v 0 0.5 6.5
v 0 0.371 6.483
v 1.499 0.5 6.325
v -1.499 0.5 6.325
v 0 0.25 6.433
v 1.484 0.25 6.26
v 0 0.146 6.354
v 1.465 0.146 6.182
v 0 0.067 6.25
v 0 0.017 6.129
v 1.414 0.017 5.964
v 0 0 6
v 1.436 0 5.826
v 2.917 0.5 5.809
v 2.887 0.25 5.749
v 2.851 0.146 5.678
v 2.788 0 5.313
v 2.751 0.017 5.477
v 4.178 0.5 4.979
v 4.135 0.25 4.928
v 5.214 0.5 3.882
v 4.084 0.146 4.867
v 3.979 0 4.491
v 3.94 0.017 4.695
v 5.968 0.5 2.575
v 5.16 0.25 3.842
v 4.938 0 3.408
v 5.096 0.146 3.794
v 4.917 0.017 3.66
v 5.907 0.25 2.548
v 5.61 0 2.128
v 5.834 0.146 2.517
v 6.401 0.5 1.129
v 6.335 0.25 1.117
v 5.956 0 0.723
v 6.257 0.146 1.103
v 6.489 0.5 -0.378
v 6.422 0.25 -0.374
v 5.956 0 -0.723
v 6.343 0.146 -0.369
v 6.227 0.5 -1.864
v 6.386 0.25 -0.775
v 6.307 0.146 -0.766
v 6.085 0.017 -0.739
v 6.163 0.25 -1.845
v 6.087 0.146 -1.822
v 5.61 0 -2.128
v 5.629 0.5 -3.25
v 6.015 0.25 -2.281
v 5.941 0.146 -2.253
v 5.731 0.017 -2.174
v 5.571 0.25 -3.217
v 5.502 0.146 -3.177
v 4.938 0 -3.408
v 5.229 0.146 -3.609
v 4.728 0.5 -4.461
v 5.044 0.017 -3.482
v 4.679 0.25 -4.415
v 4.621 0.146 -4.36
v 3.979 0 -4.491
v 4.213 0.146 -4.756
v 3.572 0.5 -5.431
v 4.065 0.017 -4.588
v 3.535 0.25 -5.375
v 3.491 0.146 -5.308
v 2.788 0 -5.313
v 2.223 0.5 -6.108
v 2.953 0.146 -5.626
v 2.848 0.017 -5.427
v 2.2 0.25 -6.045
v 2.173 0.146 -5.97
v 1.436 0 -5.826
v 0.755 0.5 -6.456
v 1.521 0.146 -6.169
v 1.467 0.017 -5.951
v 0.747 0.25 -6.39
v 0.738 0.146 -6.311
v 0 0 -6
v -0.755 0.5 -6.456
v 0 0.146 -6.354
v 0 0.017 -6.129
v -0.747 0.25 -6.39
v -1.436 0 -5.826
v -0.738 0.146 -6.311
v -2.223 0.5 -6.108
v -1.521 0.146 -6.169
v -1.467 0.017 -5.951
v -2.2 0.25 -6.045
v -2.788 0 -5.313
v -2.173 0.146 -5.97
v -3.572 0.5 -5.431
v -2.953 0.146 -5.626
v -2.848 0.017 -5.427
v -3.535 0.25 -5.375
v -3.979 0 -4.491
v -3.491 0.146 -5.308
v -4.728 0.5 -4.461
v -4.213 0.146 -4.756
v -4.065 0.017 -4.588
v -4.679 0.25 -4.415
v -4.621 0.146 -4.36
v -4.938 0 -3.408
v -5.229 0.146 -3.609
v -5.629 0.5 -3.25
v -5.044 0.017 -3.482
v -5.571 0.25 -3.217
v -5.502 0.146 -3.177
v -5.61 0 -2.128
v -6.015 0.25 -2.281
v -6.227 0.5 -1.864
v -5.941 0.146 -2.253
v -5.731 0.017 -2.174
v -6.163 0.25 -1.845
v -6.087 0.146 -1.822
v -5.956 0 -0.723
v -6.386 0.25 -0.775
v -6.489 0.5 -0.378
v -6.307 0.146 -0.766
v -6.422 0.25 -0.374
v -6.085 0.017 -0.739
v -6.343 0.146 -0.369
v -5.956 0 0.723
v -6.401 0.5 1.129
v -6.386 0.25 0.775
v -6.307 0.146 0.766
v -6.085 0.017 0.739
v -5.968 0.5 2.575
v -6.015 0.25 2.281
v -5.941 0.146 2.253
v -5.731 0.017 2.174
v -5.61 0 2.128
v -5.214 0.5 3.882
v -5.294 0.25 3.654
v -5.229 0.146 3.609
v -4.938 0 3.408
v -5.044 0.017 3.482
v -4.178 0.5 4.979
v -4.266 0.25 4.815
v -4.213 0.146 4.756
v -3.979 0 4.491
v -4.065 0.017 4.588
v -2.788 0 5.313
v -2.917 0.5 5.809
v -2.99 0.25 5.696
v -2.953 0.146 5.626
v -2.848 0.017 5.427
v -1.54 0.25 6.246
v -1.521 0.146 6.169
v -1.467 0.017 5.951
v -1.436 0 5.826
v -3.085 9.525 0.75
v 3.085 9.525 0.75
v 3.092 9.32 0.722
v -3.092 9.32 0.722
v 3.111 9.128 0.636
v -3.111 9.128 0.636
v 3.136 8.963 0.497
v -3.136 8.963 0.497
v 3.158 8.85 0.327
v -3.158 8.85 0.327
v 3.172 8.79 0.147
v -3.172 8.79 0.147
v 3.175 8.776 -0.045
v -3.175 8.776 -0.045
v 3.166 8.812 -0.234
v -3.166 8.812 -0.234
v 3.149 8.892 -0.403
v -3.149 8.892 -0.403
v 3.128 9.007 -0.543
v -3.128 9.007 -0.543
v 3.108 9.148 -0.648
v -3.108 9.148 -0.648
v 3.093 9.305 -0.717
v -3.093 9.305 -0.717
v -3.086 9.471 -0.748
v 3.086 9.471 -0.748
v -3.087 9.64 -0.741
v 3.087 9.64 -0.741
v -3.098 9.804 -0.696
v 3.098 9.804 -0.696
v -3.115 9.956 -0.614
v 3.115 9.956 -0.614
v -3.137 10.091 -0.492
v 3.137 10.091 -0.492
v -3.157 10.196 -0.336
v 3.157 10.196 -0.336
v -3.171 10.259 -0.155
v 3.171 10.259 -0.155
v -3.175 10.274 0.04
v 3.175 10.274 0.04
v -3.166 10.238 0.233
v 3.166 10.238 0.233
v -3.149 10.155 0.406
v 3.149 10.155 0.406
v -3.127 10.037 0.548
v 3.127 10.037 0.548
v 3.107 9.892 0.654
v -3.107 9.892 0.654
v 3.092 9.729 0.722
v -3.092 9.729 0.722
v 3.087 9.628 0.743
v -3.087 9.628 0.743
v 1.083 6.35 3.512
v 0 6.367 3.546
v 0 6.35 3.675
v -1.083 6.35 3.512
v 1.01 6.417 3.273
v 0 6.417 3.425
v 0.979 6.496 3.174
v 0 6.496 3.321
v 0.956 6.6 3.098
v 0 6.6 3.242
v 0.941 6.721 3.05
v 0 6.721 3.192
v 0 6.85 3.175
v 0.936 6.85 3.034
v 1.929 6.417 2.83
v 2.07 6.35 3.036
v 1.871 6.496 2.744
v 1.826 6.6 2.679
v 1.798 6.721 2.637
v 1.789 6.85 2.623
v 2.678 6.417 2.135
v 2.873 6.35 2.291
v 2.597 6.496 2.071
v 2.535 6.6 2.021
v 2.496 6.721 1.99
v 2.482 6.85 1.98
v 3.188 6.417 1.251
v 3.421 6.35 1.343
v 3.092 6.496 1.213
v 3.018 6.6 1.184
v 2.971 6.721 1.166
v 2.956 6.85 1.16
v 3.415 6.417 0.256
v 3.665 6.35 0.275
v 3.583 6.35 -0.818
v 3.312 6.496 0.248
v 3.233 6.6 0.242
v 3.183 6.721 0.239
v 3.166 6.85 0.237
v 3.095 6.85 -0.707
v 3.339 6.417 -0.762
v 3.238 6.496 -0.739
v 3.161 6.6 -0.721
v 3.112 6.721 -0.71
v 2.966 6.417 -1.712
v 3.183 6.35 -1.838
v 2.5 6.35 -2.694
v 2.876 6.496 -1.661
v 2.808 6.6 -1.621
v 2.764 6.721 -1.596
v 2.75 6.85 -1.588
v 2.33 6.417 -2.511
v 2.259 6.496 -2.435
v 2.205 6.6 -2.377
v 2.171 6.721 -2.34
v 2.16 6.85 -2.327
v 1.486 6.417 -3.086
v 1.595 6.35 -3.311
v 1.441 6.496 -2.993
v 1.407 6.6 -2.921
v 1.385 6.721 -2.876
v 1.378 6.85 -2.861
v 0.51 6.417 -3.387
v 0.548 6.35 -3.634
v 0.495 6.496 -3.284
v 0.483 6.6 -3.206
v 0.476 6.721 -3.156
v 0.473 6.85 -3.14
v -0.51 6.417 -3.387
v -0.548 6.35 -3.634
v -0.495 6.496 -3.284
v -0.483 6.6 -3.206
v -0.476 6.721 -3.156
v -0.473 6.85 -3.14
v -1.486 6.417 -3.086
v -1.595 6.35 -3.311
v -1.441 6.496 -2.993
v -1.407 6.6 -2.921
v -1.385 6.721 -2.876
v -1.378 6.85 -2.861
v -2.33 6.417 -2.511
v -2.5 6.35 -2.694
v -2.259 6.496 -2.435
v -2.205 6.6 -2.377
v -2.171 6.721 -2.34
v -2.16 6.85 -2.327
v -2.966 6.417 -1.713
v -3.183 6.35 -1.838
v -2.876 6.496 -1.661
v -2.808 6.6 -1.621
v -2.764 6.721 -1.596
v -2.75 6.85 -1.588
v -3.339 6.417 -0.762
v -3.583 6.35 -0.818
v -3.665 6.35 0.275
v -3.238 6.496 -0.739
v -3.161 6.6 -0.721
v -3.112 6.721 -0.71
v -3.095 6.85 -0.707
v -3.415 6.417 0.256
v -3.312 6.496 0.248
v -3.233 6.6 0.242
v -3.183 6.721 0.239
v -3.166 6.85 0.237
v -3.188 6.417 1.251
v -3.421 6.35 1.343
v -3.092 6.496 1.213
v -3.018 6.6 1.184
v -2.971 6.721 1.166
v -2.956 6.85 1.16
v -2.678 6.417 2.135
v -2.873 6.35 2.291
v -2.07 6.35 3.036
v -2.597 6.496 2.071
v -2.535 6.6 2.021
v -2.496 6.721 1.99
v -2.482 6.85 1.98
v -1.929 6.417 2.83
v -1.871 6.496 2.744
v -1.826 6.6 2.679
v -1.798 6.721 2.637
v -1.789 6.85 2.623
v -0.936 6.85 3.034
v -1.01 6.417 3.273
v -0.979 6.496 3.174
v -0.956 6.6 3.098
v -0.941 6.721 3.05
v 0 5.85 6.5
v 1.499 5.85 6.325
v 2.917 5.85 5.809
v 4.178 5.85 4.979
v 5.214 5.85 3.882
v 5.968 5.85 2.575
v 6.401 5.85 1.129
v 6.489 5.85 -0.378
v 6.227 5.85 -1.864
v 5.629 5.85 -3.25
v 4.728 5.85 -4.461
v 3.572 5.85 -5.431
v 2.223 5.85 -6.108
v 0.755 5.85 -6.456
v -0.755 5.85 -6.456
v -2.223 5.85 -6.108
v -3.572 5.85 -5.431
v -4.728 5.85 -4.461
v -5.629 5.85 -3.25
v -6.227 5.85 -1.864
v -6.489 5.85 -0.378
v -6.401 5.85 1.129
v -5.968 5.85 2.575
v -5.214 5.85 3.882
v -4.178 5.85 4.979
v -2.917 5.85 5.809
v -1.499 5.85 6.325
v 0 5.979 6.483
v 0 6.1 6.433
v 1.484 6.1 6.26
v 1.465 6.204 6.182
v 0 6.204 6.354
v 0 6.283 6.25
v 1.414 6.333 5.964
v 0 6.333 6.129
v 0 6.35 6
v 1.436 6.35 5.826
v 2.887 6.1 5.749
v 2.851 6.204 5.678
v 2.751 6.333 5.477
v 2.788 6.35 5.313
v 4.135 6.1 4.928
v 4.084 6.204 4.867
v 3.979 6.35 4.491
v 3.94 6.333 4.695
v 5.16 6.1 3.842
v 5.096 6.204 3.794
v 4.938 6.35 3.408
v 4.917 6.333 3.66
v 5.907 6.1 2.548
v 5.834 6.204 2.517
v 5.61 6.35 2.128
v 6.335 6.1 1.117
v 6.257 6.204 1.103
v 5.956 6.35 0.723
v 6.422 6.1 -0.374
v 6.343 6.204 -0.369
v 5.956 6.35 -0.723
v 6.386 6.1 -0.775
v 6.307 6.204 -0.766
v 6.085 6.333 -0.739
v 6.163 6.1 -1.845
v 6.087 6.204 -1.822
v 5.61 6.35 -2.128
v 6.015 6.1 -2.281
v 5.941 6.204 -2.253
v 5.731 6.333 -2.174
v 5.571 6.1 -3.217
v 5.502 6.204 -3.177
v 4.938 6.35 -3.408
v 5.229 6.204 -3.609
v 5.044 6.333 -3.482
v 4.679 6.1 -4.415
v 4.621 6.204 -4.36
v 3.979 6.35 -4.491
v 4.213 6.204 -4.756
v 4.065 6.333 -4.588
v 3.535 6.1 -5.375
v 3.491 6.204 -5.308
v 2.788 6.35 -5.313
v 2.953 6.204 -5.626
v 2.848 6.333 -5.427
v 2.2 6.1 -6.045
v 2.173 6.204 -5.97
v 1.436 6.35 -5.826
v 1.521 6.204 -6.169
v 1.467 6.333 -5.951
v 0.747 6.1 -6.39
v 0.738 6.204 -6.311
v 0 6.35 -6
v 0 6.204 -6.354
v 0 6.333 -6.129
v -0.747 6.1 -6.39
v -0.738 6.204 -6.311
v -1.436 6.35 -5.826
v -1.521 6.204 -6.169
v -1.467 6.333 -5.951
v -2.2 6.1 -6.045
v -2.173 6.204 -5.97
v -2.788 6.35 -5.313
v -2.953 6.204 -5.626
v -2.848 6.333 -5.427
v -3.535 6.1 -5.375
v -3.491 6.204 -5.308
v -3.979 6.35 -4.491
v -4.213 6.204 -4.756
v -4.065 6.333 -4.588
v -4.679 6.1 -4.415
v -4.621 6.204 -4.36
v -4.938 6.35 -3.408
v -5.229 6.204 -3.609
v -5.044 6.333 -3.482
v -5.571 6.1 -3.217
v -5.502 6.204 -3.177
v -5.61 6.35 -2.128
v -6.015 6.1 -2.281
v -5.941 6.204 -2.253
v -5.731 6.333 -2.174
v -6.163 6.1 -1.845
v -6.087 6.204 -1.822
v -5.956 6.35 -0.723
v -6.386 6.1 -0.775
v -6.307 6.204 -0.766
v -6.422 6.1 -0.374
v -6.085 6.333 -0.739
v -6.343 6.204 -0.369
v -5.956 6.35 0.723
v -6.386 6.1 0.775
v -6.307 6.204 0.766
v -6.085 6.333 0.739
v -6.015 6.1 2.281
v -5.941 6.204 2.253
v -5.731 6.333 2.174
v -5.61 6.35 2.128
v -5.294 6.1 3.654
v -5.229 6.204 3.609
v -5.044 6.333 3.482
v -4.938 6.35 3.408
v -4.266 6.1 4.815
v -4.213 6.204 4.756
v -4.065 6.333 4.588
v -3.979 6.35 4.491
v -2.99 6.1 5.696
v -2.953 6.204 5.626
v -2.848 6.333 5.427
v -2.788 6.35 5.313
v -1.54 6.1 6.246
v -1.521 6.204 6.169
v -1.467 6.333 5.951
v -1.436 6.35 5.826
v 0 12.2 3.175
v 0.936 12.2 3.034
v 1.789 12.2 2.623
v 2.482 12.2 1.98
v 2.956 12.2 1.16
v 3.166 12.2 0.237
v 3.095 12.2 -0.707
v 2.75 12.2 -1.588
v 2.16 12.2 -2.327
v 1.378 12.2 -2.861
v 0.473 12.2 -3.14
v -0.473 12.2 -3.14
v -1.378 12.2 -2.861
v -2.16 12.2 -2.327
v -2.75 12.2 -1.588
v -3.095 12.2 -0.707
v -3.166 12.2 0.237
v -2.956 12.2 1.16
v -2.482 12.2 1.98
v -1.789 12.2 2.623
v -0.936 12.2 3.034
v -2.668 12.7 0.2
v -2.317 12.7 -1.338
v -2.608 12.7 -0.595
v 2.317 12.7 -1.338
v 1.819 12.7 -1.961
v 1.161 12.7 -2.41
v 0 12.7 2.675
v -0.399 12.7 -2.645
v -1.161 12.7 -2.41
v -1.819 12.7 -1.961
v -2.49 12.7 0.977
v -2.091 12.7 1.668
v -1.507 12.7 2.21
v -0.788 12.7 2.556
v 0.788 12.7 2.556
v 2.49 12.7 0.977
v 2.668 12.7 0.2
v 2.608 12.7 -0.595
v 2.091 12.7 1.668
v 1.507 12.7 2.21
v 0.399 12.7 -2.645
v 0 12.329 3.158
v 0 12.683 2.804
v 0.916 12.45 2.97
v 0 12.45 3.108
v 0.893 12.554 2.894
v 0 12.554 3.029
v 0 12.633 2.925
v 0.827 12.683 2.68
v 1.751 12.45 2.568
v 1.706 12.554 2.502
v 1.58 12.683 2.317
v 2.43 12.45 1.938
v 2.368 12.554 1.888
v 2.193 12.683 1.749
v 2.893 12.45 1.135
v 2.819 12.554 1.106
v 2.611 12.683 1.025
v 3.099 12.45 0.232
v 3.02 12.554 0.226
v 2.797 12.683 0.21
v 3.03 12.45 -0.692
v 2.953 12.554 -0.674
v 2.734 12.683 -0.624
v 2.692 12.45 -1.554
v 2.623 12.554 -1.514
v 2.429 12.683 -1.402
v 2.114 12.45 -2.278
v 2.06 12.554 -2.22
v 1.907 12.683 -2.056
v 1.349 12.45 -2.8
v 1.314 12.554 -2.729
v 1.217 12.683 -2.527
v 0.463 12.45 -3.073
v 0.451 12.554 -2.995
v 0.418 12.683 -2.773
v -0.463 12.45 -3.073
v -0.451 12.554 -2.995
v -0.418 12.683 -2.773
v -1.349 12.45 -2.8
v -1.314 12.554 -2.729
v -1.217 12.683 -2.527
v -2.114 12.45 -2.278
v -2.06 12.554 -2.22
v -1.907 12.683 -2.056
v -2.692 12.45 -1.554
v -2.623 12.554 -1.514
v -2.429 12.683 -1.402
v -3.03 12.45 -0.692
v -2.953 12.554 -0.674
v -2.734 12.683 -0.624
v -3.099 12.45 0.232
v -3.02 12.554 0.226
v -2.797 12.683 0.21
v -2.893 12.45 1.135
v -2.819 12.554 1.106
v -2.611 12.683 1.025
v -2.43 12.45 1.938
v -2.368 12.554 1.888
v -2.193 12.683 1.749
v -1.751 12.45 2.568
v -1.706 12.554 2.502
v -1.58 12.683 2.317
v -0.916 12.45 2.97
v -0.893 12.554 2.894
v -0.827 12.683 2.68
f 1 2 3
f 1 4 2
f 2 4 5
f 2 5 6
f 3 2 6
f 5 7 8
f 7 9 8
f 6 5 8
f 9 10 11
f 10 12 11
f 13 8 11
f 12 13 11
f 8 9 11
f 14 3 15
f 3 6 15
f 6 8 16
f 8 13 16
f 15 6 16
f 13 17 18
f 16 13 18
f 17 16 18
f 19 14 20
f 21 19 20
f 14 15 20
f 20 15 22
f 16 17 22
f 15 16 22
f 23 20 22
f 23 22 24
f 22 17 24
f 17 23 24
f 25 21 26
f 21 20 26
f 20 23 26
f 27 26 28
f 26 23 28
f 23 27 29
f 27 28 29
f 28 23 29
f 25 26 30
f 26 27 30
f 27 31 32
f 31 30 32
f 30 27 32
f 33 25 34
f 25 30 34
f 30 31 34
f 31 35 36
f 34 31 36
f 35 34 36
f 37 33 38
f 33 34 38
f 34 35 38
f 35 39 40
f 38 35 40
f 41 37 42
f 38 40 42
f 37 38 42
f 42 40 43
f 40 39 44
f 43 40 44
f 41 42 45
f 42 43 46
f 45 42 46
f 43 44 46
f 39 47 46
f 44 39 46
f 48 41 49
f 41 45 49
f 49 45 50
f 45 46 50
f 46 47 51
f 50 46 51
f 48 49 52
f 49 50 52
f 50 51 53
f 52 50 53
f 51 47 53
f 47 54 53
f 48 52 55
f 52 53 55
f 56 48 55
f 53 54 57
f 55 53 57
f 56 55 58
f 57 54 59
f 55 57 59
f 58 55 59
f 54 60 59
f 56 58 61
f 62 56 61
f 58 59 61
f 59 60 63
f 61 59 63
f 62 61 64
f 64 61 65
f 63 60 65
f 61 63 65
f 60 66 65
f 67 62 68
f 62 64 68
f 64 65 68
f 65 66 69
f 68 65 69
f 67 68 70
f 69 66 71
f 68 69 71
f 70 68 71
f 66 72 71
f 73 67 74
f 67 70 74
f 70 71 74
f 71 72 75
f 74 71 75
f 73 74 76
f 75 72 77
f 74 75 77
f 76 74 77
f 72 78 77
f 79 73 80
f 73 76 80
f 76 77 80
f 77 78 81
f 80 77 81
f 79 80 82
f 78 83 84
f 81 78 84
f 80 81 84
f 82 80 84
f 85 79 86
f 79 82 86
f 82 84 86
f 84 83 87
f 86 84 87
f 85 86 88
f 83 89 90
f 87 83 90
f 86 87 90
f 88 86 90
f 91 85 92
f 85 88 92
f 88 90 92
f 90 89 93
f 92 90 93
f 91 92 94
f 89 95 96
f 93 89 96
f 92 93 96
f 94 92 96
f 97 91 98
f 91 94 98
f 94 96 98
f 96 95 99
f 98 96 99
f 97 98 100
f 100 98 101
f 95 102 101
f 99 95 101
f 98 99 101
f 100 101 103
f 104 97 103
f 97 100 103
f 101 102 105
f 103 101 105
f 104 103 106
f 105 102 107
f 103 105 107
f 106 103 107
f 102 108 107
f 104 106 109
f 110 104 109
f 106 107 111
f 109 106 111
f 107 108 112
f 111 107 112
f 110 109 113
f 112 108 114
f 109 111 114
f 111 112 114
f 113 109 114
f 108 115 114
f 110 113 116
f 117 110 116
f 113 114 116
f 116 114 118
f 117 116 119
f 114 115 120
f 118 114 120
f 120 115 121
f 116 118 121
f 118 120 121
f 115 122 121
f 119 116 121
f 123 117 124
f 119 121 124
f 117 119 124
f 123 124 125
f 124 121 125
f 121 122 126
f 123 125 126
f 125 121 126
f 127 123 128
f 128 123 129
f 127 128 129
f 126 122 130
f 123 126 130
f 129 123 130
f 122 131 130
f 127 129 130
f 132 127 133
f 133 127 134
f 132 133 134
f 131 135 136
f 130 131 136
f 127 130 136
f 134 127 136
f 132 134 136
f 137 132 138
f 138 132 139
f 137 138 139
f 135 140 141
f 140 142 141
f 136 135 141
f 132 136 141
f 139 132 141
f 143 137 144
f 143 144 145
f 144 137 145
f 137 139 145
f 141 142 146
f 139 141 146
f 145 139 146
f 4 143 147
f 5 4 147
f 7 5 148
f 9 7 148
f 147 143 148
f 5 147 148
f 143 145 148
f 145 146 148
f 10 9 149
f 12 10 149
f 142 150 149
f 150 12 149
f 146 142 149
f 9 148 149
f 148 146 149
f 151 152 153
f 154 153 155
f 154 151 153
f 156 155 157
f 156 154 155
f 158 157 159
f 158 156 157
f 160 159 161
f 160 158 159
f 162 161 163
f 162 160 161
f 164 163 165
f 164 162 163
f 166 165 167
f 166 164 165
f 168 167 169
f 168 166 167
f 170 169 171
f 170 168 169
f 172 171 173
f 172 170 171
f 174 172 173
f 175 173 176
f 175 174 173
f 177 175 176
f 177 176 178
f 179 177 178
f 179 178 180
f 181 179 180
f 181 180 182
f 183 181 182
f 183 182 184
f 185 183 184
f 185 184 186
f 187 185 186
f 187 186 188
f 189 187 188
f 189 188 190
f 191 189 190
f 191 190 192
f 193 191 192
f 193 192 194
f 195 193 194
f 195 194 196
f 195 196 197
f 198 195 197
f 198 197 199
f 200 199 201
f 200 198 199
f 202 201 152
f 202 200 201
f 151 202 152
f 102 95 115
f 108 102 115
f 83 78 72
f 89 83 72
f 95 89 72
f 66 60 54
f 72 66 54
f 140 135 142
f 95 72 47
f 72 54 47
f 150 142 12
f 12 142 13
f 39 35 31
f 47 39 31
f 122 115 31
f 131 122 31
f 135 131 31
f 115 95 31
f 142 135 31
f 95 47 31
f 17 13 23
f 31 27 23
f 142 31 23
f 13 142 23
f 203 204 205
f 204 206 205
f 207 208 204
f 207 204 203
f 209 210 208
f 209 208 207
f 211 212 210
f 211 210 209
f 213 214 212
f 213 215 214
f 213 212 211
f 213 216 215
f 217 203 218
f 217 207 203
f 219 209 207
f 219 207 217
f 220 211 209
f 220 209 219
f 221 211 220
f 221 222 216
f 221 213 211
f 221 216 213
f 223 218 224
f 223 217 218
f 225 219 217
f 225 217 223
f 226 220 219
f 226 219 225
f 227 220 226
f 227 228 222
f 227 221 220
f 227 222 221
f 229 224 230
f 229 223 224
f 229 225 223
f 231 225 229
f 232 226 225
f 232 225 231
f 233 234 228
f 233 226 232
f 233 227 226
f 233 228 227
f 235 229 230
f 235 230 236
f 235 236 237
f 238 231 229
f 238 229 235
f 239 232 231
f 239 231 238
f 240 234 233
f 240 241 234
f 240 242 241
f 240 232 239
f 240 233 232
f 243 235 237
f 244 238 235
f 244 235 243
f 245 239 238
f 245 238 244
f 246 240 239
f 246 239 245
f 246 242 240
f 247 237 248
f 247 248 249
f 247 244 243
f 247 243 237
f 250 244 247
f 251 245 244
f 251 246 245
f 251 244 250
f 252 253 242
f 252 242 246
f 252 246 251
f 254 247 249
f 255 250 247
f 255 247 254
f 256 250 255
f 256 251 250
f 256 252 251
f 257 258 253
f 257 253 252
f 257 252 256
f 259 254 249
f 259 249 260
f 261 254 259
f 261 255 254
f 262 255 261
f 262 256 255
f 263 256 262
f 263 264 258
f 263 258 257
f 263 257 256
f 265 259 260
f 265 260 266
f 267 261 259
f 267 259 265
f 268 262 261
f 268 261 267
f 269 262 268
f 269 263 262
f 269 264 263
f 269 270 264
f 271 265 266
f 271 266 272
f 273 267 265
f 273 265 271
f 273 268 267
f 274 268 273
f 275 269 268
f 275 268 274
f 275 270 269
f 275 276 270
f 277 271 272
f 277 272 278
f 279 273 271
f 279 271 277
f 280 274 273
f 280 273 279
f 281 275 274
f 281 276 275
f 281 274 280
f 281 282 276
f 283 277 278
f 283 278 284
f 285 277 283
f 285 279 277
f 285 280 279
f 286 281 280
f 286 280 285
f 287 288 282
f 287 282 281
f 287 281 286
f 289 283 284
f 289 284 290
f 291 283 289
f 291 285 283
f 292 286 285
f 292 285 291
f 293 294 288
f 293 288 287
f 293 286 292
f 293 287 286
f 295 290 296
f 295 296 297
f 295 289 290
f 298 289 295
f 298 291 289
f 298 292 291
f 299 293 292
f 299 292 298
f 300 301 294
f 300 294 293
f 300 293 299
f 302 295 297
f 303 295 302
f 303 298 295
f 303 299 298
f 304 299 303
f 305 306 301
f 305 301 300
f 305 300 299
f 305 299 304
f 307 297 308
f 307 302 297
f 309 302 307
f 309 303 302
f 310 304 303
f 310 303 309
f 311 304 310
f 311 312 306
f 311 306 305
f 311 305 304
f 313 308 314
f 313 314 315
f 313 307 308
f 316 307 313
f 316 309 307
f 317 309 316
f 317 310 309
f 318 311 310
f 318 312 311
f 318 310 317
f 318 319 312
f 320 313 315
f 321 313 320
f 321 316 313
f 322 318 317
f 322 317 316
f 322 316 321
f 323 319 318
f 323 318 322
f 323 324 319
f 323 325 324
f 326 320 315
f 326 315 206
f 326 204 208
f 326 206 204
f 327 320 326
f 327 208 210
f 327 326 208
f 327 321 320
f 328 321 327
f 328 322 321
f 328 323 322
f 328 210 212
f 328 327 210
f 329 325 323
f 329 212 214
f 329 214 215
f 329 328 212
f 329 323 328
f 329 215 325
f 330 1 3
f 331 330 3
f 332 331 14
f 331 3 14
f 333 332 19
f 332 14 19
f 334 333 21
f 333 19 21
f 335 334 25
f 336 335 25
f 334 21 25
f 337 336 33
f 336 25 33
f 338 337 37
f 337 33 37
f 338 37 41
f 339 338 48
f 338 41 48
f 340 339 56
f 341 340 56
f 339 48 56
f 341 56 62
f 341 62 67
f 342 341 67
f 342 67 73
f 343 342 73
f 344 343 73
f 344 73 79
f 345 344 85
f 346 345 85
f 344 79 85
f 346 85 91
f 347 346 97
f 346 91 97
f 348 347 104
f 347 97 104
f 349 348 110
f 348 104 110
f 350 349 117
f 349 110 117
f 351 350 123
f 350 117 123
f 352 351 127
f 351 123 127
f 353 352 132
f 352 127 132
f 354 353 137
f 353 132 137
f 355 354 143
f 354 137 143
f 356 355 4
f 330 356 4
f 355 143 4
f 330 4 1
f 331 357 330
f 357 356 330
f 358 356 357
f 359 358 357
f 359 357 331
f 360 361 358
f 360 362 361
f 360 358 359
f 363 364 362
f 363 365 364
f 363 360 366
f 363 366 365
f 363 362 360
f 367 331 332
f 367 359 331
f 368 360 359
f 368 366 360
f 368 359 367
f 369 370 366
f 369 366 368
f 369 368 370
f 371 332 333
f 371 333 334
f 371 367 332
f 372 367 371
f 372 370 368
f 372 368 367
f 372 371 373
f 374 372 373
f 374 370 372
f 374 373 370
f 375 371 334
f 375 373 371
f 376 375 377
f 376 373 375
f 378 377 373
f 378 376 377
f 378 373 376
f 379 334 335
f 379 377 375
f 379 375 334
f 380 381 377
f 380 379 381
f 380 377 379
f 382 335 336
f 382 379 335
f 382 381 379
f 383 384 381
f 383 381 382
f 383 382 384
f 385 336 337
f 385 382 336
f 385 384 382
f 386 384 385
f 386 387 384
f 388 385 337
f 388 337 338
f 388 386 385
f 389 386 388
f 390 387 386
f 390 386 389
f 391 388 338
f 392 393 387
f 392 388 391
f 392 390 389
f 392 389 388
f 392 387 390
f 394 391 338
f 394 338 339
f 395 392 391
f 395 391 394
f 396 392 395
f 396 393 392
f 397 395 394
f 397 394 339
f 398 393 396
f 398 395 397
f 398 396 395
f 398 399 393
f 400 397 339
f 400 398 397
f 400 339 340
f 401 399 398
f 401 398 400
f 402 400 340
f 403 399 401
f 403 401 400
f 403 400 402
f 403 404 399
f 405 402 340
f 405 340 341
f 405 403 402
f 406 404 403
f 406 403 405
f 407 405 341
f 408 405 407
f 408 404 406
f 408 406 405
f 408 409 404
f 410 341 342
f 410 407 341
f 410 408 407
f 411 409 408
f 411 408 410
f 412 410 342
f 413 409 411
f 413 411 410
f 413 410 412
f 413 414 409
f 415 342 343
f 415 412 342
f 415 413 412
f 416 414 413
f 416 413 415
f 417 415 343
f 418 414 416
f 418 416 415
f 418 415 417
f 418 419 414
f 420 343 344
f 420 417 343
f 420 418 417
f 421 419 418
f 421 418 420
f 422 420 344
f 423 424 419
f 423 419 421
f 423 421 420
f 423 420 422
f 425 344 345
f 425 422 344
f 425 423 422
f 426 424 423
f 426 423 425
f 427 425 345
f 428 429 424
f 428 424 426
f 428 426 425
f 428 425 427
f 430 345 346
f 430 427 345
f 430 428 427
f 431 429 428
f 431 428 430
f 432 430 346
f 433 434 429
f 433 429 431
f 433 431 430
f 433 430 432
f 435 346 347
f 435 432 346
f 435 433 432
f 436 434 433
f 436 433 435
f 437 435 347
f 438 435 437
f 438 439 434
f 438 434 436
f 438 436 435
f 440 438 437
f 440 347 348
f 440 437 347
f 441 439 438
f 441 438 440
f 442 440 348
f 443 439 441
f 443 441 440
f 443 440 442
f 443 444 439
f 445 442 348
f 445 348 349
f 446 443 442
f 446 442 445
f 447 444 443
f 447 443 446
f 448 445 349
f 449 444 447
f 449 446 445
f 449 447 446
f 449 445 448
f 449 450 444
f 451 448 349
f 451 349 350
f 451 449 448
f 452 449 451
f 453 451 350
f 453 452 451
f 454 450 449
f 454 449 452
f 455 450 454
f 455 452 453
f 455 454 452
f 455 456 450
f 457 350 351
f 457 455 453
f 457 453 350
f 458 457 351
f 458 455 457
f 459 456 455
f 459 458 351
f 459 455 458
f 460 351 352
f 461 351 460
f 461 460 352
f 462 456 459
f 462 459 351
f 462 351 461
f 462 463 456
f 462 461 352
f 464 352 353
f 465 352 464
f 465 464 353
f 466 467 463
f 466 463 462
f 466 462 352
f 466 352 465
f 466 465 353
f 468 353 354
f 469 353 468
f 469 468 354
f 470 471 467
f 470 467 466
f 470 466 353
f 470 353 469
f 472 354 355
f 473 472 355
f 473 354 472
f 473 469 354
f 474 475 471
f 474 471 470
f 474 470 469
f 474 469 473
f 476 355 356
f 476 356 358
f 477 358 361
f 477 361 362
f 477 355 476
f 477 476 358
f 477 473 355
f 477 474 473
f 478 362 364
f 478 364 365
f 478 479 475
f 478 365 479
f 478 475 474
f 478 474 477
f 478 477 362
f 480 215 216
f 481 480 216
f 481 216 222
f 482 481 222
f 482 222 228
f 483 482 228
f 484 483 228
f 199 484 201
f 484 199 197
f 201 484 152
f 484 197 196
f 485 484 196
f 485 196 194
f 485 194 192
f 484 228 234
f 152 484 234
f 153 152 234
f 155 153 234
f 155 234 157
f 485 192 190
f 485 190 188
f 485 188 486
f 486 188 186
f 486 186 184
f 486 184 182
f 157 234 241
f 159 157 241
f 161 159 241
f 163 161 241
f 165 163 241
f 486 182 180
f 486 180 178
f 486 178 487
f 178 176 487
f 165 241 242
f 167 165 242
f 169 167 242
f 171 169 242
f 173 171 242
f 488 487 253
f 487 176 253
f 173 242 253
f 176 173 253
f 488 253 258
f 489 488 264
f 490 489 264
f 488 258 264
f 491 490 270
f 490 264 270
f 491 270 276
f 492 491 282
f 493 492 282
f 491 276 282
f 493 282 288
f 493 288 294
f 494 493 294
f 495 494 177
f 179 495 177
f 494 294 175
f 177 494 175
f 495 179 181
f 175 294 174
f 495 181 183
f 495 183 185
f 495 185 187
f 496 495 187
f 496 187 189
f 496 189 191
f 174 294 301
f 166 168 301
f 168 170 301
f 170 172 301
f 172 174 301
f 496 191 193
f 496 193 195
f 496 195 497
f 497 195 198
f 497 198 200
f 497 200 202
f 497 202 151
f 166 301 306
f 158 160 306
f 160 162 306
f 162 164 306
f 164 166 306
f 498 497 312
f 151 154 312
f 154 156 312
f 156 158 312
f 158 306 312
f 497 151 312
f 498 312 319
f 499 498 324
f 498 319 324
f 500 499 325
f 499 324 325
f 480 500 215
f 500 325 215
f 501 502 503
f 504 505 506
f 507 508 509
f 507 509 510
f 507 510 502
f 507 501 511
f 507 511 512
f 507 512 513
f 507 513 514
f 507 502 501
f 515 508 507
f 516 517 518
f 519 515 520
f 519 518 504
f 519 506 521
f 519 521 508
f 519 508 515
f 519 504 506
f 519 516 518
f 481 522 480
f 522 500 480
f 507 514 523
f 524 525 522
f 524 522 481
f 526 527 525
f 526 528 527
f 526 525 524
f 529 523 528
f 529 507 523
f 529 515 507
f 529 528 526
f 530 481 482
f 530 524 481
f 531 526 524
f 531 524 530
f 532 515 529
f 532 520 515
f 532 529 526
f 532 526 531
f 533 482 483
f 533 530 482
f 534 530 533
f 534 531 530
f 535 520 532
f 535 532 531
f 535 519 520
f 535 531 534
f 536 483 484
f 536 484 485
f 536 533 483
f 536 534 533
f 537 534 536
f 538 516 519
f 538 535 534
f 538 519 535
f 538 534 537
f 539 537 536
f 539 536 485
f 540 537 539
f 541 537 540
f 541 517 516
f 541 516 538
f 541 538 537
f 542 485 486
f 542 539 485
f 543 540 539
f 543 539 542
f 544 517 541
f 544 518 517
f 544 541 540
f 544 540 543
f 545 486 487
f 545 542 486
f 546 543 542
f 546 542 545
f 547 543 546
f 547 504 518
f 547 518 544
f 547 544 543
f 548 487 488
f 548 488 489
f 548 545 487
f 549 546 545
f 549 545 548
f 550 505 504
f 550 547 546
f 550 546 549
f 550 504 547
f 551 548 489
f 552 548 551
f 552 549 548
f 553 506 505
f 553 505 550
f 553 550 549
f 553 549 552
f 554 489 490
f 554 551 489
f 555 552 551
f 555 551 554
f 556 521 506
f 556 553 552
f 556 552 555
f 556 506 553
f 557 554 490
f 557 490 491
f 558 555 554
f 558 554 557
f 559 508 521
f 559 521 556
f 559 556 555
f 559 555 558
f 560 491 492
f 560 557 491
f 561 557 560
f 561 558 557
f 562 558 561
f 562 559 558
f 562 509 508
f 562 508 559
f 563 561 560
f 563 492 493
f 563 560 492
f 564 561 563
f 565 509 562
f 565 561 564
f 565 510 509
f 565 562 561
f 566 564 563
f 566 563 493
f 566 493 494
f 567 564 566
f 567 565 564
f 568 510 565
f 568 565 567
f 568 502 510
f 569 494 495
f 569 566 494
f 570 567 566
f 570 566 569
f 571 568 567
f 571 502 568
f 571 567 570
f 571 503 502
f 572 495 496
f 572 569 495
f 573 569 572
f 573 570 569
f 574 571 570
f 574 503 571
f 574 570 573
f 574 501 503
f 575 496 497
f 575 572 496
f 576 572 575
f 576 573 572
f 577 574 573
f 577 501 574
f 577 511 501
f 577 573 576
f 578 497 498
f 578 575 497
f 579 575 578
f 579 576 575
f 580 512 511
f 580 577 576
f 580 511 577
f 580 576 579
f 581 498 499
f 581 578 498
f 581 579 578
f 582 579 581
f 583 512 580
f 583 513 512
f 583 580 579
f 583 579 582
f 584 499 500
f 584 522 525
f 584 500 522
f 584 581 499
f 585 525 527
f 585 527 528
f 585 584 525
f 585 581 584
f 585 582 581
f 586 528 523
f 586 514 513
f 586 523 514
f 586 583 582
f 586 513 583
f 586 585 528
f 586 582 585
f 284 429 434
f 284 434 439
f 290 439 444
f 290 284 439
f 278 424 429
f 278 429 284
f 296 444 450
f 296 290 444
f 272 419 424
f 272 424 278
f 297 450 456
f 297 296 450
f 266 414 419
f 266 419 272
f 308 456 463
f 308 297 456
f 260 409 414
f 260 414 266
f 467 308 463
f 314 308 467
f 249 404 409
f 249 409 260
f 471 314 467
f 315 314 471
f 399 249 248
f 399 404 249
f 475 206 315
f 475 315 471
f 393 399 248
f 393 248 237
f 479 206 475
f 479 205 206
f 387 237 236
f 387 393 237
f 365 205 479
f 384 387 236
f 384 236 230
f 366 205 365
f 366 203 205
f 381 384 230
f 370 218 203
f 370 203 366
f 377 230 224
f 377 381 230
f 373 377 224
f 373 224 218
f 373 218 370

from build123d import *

# Parameters (mm, degrees)
SKETCH2_R               = 6.5
BOSS_EXTRUDE1_DEPTH     = 6.35
SKETCH3_R               = 3.175
BOSS_EXTRUDE2_DEPTH     = 6.35
CUT_EXTRUDE1_DEPTH      = 6.35
CUT_EXTRUDE1_DEPTH_BACK = 6.35
SKETCH4_R               = 0.75
FILLET1_R               = 0.5


with BuildPart() as part:
    # Sketch2 → Boss-Extrude1 (new body)
    with BuildSketch(Plane(origin=(0, 0, 0), x_dir=(1, 0, 0), z_dir=(0, 1, 0))):
        Circle(SKETCH2_R)
    extrude(amount=BOSS_EXTRUDE1_DEPTH)

    # Sketch3 → Boss-Extrude2 (add)
    with BuildSketch(Plane(origin=(0, 6.35, 0), x_dir=(1, 0, 0), z_dir=(0, 1, 0))):
        Circle(SKETCH3_R)
    extrude(amount=BOSS_EXTRUDE2_DEPTH)

    # Sketch4 → Cut-Extrude1 (cut, two sides: drawn at the far end of the back side and taken through both)
    with BuildSketch(Plane(origin=(0, 0, 0), x_dir=(0, 0, -1), z_dir=(1, 0, 0)).offset(-CUT_EXTRUDE1_DEPTH_BACK)):
        with Locations((0, 9.525)):
            Circle(SKETCH4_R)
    extrude(amount=CUT_EXTRUDE1_DEPTH + CUT_EXTRUDE1_DEPTH_BACK, mode=Mode.SUBTRACT)

    # Fillet1
    fillet1_edges = [part.edges().sort_by_distance(p)[0] for p in [
        (-6.5, 0, 0),
        (-3.175, 12.7, 0),
        (-6.5, 6.35, 0),
        (-3.175, 6.35, 0),
    ]]
    fillet(fillet1_edges, radius=FILLET1_R)


solid = part.part
